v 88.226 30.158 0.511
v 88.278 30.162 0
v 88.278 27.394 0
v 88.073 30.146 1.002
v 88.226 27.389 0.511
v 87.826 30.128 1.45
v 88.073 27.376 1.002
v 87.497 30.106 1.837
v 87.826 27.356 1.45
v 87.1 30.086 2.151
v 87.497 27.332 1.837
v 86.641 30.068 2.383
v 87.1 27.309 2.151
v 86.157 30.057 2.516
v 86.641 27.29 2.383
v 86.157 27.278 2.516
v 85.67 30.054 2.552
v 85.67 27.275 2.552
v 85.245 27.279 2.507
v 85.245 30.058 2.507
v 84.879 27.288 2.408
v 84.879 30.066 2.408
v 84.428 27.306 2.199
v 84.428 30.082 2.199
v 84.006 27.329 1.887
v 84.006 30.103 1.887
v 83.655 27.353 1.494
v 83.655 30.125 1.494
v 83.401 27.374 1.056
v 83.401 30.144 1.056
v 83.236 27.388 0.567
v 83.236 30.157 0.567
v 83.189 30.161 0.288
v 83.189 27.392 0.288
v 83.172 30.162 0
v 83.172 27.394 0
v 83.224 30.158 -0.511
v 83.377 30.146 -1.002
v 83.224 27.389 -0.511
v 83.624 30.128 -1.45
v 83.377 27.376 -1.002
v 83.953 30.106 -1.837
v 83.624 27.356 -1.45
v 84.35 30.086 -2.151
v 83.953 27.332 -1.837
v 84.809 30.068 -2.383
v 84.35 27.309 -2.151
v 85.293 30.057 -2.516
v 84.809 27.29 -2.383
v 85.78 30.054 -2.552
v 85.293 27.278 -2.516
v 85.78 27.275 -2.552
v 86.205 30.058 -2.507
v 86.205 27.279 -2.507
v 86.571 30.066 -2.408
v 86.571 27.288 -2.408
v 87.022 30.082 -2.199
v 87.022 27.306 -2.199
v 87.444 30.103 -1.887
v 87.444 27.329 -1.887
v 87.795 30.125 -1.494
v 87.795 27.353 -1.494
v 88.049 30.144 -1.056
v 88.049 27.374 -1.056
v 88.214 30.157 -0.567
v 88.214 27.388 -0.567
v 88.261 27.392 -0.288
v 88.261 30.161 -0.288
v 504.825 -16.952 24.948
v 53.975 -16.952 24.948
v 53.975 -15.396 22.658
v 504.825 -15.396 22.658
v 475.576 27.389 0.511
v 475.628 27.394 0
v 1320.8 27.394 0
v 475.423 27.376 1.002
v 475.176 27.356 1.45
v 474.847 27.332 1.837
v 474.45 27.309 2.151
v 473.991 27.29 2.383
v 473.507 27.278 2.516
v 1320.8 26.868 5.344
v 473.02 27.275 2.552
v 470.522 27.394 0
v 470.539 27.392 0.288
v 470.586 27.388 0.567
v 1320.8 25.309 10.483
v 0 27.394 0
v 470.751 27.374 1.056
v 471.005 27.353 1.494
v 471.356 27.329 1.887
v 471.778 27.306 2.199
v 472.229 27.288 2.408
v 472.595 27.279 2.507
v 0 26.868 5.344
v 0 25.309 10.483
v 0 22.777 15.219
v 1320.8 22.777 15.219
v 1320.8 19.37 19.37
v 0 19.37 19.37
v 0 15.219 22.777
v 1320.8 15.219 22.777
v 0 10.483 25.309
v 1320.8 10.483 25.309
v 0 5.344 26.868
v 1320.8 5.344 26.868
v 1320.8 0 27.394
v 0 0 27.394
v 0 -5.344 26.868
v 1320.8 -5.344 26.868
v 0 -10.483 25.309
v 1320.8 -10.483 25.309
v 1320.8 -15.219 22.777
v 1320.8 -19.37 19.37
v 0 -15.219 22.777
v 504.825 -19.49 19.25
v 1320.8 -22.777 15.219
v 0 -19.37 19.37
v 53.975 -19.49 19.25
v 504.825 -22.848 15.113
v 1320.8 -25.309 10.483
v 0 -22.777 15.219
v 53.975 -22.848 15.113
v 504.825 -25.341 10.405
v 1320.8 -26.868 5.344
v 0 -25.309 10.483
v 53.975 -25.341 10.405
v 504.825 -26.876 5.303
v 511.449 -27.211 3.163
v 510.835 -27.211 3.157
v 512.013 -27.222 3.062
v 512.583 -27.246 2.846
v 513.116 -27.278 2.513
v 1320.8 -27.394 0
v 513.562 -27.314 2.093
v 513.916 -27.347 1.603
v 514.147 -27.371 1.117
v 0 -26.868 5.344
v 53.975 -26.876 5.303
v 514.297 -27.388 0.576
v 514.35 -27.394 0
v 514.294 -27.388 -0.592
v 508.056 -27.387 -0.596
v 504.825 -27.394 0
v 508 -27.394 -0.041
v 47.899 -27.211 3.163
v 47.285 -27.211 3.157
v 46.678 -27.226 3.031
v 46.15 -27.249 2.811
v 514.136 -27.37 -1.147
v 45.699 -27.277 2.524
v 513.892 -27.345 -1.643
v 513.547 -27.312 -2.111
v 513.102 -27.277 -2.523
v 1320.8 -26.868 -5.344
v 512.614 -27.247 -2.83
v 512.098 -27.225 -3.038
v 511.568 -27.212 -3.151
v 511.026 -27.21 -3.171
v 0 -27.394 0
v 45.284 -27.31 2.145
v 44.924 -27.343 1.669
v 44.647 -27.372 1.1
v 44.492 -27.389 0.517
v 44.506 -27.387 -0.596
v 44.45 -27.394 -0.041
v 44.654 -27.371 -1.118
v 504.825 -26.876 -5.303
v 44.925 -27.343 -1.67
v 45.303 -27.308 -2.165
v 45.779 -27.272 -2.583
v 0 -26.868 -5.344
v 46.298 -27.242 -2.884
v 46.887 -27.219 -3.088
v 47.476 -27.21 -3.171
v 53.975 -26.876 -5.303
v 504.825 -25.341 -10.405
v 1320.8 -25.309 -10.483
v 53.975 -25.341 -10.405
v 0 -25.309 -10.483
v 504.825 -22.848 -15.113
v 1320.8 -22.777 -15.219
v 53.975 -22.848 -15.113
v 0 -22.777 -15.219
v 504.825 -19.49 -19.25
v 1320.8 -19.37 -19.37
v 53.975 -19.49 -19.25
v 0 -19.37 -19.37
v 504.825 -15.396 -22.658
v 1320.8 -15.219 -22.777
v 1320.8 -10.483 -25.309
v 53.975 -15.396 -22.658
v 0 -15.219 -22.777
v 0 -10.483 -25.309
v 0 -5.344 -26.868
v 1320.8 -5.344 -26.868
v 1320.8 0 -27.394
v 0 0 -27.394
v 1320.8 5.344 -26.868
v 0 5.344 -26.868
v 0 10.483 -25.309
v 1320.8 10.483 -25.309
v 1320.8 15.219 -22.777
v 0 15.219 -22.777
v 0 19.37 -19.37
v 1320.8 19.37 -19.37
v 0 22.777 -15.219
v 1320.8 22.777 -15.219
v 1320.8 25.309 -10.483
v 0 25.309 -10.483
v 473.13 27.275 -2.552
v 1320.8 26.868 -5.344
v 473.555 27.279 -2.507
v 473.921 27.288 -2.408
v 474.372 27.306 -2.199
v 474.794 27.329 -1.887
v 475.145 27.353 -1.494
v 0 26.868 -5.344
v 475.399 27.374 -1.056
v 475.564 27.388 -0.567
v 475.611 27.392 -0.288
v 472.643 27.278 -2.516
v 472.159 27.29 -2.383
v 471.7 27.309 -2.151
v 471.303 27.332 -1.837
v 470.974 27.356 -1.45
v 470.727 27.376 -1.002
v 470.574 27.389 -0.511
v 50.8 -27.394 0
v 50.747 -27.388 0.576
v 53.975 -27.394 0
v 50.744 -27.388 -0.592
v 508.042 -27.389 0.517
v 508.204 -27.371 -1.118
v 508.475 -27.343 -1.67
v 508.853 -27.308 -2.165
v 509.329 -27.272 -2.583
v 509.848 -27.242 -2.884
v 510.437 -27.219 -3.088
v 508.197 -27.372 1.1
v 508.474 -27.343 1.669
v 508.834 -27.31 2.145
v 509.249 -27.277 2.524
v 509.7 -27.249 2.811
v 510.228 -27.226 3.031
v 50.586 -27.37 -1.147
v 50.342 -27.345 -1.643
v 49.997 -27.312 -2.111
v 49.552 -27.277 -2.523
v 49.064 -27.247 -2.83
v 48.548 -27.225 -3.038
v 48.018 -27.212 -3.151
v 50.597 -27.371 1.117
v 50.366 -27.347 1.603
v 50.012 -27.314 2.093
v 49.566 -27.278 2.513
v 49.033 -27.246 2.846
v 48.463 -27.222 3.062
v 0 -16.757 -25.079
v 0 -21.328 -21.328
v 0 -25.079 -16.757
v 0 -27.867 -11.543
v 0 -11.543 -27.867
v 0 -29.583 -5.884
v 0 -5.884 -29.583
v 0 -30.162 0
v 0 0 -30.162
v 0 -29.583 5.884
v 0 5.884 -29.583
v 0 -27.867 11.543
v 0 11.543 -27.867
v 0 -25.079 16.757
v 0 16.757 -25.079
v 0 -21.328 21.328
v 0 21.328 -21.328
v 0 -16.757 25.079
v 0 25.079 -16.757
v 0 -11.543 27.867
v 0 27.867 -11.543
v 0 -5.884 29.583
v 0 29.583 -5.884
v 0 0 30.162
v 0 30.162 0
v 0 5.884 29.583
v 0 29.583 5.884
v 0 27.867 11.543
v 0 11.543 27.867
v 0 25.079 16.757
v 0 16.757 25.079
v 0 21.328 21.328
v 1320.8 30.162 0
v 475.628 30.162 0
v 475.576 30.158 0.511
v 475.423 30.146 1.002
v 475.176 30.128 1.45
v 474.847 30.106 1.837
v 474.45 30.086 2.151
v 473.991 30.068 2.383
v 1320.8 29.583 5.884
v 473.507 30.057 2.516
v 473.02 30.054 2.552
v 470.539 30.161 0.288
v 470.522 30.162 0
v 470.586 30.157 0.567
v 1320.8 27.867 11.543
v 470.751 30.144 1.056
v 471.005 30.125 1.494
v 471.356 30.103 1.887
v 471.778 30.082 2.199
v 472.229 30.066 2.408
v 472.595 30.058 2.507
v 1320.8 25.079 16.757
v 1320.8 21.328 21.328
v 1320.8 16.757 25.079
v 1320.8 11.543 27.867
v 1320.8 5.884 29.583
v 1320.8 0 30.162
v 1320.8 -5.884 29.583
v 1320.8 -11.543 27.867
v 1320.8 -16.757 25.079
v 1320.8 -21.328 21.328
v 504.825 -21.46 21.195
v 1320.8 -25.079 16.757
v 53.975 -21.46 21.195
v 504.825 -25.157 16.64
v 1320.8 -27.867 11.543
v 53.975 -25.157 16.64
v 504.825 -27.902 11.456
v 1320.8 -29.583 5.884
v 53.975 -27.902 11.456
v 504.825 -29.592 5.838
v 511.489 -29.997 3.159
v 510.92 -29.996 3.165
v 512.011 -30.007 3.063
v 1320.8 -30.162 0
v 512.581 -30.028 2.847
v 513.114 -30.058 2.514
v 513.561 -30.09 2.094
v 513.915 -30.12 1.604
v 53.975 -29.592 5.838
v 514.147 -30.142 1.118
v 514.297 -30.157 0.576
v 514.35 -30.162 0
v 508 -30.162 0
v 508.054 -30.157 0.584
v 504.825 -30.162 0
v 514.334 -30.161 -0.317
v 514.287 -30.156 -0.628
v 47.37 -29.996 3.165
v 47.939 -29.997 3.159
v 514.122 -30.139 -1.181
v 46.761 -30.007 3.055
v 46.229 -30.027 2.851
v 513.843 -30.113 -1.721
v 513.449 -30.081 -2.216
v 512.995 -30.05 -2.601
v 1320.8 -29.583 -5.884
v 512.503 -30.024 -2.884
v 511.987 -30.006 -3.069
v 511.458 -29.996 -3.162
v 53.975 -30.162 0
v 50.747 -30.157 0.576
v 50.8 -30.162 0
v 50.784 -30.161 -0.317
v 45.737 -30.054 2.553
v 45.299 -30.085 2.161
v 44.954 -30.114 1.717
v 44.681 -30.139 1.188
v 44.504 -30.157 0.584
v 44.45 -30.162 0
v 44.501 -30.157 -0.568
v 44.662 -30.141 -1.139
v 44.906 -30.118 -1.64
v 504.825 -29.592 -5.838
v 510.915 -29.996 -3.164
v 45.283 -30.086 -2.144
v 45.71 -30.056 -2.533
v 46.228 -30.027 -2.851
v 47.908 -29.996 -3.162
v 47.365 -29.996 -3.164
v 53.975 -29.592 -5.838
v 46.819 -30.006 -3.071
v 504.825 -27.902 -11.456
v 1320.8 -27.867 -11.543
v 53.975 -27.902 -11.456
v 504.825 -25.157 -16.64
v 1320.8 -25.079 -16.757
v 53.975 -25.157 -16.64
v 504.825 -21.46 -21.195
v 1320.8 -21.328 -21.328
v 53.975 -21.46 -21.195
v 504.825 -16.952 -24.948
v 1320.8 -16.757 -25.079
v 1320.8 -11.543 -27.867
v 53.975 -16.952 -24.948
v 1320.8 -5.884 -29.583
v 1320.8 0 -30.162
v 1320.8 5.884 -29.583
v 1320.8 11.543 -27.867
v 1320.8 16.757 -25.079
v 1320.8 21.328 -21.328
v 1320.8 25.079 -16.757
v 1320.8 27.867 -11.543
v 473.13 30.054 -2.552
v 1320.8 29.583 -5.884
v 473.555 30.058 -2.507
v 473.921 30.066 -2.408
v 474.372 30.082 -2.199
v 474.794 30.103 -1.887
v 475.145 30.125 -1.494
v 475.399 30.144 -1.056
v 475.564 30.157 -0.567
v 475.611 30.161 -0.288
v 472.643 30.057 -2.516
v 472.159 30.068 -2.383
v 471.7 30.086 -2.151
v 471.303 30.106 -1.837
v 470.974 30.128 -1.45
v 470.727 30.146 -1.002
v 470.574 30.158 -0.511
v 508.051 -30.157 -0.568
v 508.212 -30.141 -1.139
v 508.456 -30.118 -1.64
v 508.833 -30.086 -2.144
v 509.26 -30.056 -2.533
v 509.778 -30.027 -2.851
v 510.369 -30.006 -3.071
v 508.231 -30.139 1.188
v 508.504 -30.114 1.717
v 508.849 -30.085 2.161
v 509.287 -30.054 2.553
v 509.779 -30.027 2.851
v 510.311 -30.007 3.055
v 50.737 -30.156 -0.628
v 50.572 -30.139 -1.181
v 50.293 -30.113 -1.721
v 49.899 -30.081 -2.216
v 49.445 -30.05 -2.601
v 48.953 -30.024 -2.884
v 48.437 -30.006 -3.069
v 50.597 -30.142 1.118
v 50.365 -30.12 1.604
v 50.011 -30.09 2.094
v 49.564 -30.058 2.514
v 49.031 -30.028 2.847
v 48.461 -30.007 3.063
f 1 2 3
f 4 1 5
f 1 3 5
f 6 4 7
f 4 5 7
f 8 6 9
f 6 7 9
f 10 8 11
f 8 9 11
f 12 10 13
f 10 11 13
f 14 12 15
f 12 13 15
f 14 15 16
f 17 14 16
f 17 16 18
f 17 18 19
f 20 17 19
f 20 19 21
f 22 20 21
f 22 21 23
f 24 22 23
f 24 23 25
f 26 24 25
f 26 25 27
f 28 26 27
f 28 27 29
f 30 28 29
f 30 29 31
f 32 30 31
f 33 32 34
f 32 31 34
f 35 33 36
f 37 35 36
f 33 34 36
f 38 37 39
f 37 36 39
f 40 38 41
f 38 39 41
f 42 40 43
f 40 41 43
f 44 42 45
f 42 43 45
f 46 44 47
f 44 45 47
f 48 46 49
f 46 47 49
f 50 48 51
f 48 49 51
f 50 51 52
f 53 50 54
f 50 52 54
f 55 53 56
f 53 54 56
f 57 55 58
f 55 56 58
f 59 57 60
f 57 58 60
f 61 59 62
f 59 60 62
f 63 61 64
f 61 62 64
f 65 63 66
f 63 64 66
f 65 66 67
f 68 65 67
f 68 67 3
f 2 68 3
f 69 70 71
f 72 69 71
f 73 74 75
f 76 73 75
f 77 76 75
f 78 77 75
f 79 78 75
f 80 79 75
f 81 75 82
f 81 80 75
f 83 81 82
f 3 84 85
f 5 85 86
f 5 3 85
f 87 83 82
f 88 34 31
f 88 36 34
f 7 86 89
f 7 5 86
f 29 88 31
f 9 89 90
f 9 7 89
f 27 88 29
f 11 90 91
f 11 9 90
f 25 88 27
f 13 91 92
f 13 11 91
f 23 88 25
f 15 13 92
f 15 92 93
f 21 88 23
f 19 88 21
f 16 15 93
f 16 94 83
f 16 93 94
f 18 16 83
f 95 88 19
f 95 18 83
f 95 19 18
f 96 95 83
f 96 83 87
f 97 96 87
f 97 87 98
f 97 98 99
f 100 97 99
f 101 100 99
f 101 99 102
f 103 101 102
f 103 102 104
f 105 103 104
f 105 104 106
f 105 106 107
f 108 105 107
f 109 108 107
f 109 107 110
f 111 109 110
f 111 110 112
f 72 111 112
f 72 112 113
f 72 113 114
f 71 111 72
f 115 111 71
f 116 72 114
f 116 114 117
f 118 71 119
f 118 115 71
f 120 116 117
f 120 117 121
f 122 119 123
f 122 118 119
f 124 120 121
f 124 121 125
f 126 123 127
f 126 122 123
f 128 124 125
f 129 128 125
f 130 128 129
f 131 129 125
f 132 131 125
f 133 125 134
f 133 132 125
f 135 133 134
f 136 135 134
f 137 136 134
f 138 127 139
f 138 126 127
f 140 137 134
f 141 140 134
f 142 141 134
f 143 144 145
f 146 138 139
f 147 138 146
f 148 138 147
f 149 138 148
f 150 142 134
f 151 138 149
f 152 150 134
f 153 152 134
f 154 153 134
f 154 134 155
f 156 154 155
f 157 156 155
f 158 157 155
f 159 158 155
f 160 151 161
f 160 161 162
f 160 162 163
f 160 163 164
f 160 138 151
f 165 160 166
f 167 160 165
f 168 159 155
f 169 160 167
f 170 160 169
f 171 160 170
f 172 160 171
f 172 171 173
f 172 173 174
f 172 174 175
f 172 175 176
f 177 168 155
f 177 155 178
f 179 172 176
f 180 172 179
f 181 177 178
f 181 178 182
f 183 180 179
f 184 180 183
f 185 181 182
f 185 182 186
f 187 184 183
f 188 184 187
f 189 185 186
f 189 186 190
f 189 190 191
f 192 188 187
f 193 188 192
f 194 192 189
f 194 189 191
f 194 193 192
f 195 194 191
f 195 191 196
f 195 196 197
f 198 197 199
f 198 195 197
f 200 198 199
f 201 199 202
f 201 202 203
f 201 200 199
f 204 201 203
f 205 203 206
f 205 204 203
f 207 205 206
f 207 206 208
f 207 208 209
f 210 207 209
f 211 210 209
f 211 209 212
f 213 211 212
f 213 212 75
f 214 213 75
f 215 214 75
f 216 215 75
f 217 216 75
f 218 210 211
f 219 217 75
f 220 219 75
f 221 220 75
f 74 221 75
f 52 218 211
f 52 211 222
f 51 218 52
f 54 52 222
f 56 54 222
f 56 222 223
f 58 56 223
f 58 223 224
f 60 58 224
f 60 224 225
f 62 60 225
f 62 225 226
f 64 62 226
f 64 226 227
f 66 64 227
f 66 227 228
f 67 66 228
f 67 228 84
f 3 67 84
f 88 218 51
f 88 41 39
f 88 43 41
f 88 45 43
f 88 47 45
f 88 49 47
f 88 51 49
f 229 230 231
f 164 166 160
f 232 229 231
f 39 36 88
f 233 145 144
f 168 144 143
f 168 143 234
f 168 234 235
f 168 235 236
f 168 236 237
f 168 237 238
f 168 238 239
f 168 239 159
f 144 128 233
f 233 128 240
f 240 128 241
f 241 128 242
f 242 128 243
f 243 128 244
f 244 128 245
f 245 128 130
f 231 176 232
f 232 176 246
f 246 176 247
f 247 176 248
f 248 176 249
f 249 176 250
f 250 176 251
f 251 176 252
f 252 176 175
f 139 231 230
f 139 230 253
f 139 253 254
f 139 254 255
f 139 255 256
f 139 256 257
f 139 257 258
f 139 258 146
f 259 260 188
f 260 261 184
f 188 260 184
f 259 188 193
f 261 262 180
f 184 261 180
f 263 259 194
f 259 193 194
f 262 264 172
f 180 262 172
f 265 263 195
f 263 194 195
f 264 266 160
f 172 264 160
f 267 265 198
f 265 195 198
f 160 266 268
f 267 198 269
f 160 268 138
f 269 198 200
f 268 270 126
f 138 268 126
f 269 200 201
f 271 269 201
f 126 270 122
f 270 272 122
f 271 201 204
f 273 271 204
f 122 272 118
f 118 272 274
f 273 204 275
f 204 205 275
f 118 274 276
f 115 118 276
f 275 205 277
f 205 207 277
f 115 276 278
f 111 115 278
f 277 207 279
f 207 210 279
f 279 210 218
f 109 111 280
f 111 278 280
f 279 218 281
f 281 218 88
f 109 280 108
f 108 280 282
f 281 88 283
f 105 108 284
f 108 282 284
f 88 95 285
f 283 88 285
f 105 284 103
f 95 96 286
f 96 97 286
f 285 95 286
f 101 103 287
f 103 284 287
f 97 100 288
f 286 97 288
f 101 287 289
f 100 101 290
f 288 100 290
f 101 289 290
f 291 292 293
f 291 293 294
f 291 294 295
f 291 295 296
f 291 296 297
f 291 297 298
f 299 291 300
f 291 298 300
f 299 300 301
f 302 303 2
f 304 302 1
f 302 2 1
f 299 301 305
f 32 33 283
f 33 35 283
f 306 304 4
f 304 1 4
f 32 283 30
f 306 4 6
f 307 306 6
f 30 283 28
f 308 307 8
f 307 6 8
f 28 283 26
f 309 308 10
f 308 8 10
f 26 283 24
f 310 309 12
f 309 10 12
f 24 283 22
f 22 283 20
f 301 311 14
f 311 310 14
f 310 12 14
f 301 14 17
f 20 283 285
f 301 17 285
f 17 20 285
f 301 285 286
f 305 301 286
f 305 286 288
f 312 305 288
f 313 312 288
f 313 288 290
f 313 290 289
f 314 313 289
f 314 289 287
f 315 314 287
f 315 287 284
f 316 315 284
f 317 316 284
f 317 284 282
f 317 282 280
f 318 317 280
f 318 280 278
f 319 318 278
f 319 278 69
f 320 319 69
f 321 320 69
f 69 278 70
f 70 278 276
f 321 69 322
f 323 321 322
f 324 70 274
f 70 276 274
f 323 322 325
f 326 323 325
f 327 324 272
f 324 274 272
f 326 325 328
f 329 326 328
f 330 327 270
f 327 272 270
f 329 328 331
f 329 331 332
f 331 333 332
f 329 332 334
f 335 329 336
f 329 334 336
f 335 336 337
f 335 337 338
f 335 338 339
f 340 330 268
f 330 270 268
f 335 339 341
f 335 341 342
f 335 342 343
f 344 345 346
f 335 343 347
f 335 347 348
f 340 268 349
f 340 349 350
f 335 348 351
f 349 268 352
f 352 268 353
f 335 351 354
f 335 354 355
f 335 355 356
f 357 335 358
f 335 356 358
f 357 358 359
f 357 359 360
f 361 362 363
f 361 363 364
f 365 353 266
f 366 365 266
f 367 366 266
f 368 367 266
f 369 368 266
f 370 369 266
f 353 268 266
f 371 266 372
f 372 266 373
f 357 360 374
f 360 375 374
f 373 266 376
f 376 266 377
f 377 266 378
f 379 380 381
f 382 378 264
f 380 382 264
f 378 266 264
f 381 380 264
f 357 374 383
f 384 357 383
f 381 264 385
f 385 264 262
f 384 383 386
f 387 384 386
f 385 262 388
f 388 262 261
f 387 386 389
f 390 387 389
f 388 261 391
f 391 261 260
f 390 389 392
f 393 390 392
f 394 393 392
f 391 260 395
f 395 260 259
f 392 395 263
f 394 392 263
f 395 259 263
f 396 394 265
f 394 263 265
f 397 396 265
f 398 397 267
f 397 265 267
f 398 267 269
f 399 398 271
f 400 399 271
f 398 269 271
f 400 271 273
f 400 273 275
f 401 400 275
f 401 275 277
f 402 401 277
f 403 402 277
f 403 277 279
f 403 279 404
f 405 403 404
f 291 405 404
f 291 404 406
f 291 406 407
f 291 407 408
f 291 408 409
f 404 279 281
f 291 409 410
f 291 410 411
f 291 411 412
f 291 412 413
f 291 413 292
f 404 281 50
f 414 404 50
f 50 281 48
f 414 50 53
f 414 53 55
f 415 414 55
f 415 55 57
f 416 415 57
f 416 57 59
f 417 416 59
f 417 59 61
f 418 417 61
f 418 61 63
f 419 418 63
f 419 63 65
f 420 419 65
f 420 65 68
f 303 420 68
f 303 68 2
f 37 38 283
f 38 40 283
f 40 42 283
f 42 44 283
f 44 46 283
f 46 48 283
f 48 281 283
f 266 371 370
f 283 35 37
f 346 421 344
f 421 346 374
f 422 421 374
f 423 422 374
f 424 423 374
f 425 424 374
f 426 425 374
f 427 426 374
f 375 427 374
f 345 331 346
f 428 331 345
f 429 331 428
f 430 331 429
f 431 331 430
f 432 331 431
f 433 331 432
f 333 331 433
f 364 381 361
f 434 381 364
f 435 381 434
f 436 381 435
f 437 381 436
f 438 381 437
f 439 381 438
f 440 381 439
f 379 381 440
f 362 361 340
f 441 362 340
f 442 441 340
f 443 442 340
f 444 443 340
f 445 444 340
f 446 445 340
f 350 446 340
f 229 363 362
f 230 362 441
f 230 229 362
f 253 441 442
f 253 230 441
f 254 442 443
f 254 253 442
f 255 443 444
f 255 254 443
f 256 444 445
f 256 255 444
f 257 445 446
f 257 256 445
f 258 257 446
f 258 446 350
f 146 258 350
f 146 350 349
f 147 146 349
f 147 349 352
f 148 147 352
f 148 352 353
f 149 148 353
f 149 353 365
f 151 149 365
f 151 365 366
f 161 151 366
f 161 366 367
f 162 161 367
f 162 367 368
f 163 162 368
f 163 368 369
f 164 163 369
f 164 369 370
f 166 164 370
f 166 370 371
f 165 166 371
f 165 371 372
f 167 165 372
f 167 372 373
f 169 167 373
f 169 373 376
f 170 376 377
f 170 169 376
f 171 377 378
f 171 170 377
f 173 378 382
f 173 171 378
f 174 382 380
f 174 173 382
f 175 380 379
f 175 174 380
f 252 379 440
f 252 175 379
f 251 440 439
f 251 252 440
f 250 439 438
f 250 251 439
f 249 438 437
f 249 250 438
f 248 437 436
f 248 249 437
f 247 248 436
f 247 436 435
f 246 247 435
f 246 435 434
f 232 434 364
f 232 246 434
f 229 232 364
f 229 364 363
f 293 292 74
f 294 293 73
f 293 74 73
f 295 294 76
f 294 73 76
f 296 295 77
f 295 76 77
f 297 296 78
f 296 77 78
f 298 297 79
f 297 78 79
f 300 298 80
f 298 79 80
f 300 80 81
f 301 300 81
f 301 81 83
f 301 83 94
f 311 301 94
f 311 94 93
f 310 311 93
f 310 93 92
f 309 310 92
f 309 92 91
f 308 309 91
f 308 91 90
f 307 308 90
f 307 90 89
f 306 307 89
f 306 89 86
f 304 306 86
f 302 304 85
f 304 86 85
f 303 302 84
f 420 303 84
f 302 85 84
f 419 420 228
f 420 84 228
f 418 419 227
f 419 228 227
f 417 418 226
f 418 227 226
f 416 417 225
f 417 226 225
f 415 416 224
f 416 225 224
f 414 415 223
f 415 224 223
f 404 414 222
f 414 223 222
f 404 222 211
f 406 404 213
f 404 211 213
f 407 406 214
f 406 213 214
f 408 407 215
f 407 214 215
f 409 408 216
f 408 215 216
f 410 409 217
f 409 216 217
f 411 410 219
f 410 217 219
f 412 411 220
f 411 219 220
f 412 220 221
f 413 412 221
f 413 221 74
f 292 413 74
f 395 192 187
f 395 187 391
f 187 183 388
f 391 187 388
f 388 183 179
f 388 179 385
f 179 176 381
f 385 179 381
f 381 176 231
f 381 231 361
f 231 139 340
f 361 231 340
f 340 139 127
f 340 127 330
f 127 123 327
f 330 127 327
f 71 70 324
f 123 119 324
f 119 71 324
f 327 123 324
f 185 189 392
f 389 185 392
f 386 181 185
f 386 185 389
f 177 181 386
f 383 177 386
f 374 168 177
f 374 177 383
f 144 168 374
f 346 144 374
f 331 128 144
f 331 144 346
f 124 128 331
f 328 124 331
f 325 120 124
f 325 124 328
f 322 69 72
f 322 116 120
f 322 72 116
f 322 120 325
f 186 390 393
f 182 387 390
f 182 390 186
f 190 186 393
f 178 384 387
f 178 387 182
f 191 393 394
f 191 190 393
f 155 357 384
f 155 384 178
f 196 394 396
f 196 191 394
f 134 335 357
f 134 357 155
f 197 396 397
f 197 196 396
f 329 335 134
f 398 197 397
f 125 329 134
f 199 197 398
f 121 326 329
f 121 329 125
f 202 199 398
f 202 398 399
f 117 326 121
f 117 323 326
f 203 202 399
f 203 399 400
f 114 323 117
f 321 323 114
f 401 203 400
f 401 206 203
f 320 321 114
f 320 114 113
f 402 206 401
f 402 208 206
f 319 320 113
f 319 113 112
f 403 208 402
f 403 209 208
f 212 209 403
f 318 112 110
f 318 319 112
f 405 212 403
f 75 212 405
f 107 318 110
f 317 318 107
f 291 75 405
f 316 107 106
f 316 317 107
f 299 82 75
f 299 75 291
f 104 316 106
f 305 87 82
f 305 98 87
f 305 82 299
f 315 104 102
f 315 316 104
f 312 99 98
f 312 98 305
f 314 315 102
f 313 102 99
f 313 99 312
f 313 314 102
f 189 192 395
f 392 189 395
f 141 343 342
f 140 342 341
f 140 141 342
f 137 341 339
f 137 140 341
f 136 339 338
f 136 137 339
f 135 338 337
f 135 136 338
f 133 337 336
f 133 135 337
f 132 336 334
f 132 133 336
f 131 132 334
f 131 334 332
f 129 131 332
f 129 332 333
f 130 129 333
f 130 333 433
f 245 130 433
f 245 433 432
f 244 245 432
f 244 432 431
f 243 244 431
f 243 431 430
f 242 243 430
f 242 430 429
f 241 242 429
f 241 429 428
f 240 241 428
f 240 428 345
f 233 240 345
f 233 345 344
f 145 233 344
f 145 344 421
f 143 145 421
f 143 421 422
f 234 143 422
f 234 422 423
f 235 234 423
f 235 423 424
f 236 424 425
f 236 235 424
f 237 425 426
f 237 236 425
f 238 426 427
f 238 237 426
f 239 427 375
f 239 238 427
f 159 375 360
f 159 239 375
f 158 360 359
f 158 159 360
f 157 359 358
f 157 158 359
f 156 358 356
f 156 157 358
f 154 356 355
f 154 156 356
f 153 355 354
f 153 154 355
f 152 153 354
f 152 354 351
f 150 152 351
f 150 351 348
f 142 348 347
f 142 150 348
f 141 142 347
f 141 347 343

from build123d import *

# Parameters (mm, degrees)
F0_R     = 30.1625
F0_R_2   = 27.3939
F1_DEPTH = 1320.8
F4_DEPTH = 450.85
F5_R     = 3.175
F6_DEPTH = 76.2
F7_R     = 2.5527
F8_DEPTH = 76.2


with BuildPart() as f1:
    # F0 (on Right) → F1 (new body)
    with BuildSketch(Plane.YZ):
        Circle(F0_R)
        Circle(F0_R_2, mode=Mode.SUBTRACT)
    extrude(amount=F1_DEPTH)

    # F3 (on offset) → F4 (cut)
    with BuildSketch(Plane(origin=(53.975, 0, 0), x_dir=(0, -1, 0), z_dir=(-1, 0, 0))):
        Polygon((28.7277697928, 42.2795656081), (0, 0), (35.903159529, 0), align=None)
        Polygon((35.903159529, 0), (0, 0), (28.4545668533, -41.8774842184), align=None)
    extrude(amount=-F4_DEPTH, mode=Mode.SUBTRACT)

    # F5 (on Front) → F6 (cut)
    with BuildSketch(Plane.XZ):
        with Locations((47.625, 0)):
            Circle(F5_R)
        with Locations((511.175, 0)):
            Circle(F5_R)
    extrude(amount=F6_DEPTH, mode=Mode.SUBTRACT)

    # F7 (on Front) → F8 (cut)
    with BuildSketch(Plane.XZ):
        with Locations((85.725, 0)):
            Circle(F7_R)
        with Locations((473.075, 0)):
            Circle(F7_R)
    extrude(amount=-F8_DEPTH, mode=Mode.SUBTRACT)


solid = f1.part
